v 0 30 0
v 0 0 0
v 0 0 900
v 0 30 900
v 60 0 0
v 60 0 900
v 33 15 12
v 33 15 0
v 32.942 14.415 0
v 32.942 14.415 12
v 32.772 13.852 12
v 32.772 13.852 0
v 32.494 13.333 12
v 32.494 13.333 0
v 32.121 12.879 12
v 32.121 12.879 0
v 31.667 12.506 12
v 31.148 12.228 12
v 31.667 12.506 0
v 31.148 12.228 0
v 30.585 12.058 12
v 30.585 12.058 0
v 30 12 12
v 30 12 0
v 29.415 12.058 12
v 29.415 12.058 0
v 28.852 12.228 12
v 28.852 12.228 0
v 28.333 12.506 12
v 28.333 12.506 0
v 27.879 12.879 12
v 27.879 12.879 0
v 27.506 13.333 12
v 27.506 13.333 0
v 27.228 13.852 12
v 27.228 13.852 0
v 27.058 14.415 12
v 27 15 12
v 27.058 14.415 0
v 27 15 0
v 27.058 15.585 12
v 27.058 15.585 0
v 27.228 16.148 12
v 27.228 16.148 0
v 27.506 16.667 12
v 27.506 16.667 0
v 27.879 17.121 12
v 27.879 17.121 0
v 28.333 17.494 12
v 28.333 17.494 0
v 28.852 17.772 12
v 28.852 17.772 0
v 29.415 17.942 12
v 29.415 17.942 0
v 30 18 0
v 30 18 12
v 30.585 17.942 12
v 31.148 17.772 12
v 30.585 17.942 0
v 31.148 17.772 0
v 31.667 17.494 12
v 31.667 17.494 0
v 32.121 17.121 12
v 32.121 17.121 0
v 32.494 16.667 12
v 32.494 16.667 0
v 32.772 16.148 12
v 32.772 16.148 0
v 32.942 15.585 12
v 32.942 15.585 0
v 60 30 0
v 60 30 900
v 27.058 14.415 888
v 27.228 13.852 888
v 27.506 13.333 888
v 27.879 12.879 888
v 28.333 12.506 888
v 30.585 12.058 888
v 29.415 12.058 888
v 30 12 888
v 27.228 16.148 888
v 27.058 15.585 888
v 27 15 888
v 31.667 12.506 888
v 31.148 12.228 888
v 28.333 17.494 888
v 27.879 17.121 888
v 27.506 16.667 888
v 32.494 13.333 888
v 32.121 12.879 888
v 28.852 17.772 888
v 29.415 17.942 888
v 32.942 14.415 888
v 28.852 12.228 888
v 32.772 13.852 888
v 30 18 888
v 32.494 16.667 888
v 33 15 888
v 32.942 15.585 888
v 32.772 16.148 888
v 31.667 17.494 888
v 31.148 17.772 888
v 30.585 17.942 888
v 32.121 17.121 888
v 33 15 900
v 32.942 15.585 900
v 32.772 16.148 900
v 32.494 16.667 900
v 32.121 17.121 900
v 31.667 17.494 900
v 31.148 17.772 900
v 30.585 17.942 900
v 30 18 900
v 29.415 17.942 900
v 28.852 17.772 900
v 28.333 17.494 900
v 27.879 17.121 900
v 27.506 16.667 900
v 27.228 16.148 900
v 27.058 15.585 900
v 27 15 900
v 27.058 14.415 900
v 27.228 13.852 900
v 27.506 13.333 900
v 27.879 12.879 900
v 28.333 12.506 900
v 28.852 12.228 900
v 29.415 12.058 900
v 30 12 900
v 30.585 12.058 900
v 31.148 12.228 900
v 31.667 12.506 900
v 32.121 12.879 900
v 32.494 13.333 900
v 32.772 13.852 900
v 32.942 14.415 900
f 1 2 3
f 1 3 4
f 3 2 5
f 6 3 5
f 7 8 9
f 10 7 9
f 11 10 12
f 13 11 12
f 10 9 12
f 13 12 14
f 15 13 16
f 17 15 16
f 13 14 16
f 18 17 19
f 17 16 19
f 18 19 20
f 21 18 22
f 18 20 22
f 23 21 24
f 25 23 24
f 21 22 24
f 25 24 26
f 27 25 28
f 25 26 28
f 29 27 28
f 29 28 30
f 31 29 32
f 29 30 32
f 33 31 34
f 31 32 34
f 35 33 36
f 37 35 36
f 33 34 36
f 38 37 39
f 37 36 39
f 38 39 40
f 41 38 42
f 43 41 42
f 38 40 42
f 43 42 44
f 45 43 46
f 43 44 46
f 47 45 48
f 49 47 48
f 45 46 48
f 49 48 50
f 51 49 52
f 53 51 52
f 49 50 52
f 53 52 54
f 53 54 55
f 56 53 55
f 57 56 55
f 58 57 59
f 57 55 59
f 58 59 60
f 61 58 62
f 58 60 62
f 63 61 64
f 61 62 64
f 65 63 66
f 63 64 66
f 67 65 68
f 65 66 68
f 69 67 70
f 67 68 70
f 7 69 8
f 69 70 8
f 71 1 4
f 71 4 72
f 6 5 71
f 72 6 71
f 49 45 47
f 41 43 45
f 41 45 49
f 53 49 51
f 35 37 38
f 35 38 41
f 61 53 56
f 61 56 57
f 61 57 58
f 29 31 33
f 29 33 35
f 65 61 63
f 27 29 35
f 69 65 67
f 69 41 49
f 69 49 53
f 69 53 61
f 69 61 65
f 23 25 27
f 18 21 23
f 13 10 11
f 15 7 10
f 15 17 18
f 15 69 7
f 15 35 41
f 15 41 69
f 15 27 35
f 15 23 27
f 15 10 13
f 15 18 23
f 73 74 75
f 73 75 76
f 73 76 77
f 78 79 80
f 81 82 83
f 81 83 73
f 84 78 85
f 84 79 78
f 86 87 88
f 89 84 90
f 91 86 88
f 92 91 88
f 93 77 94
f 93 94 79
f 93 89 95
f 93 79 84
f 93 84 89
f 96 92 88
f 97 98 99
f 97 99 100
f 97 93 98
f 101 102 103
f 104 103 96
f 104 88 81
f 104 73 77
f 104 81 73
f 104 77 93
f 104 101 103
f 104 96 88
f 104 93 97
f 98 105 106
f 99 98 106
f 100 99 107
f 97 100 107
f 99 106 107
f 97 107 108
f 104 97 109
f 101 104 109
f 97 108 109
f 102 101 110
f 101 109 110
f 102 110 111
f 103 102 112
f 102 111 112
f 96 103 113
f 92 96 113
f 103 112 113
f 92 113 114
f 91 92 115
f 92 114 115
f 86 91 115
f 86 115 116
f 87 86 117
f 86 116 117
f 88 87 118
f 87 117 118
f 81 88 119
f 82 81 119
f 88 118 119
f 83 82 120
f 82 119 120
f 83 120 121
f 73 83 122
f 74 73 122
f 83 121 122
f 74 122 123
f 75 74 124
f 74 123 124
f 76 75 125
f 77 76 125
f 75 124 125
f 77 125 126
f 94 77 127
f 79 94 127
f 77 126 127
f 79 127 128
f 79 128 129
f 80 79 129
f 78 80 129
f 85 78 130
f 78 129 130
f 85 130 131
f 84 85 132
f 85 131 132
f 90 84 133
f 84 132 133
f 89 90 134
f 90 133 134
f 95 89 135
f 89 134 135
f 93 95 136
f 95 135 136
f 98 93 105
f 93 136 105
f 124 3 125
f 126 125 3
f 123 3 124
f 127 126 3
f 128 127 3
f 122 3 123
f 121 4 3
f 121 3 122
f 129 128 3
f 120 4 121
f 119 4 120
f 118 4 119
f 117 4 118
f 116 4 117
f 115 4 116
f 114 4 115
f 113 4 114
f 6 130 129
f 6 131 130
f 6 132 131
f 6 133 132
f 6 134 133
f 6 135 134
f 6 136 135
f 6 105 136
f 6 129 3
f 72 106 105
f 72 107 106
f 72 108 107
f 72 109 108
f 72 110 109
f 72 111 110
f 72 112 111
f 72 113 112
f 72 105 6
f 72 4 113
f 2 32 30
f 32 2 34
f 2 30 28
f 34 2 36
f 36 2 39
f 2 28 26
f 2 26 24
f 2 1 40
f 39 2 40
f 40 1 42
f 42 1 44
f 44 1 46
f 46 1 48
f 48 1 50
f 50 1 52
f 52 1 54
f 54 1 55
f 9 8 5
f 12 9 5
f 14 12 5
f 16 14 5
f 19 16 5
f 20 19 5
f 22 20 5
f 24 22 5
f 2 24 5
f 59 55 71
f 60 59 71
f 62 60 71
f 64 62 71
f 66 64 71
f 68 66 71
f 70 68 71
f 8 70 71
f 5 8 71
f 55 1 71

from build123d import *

# Parameters (mm, degrees)
F0_W     = 60
F0_H     = 30
F1_DEPTH = 900
F3_R     = 3
F4_DEPTH = 12
F5_R     = 3
F6_DEPTH = 12


with BuildPart() as f1:
    # F0 (on Top) → F1 (new body)
    with BuildSketch(Plane.XY):
        with Locations((30, 15)):
            Rectangle(F0_W, F0_H)
    extrude(amount=F1_DEPTH)

    # F3 (on face) → F4 (cut)
    with BuildSketch(Plane.XY.offset(900)):
        with Locations((30, 15)):
            Circle(F3_R)
    extrude(amount=-F4_DEPTH, mode=Mode.SUBTRACT)

    # F5 (on face) → F6 (cut)
    with BuildSketch(Plane(origin=(0, 0, 0), x_dir=(1, 0, 0), z_dir=(0, 0, -1))):
        with Locations((30, -15)):
            Circle(F5_R)
    extrude(amount=-F6_DEPTH, mode=Mode.SUBTRACT)


solid = f1.part
